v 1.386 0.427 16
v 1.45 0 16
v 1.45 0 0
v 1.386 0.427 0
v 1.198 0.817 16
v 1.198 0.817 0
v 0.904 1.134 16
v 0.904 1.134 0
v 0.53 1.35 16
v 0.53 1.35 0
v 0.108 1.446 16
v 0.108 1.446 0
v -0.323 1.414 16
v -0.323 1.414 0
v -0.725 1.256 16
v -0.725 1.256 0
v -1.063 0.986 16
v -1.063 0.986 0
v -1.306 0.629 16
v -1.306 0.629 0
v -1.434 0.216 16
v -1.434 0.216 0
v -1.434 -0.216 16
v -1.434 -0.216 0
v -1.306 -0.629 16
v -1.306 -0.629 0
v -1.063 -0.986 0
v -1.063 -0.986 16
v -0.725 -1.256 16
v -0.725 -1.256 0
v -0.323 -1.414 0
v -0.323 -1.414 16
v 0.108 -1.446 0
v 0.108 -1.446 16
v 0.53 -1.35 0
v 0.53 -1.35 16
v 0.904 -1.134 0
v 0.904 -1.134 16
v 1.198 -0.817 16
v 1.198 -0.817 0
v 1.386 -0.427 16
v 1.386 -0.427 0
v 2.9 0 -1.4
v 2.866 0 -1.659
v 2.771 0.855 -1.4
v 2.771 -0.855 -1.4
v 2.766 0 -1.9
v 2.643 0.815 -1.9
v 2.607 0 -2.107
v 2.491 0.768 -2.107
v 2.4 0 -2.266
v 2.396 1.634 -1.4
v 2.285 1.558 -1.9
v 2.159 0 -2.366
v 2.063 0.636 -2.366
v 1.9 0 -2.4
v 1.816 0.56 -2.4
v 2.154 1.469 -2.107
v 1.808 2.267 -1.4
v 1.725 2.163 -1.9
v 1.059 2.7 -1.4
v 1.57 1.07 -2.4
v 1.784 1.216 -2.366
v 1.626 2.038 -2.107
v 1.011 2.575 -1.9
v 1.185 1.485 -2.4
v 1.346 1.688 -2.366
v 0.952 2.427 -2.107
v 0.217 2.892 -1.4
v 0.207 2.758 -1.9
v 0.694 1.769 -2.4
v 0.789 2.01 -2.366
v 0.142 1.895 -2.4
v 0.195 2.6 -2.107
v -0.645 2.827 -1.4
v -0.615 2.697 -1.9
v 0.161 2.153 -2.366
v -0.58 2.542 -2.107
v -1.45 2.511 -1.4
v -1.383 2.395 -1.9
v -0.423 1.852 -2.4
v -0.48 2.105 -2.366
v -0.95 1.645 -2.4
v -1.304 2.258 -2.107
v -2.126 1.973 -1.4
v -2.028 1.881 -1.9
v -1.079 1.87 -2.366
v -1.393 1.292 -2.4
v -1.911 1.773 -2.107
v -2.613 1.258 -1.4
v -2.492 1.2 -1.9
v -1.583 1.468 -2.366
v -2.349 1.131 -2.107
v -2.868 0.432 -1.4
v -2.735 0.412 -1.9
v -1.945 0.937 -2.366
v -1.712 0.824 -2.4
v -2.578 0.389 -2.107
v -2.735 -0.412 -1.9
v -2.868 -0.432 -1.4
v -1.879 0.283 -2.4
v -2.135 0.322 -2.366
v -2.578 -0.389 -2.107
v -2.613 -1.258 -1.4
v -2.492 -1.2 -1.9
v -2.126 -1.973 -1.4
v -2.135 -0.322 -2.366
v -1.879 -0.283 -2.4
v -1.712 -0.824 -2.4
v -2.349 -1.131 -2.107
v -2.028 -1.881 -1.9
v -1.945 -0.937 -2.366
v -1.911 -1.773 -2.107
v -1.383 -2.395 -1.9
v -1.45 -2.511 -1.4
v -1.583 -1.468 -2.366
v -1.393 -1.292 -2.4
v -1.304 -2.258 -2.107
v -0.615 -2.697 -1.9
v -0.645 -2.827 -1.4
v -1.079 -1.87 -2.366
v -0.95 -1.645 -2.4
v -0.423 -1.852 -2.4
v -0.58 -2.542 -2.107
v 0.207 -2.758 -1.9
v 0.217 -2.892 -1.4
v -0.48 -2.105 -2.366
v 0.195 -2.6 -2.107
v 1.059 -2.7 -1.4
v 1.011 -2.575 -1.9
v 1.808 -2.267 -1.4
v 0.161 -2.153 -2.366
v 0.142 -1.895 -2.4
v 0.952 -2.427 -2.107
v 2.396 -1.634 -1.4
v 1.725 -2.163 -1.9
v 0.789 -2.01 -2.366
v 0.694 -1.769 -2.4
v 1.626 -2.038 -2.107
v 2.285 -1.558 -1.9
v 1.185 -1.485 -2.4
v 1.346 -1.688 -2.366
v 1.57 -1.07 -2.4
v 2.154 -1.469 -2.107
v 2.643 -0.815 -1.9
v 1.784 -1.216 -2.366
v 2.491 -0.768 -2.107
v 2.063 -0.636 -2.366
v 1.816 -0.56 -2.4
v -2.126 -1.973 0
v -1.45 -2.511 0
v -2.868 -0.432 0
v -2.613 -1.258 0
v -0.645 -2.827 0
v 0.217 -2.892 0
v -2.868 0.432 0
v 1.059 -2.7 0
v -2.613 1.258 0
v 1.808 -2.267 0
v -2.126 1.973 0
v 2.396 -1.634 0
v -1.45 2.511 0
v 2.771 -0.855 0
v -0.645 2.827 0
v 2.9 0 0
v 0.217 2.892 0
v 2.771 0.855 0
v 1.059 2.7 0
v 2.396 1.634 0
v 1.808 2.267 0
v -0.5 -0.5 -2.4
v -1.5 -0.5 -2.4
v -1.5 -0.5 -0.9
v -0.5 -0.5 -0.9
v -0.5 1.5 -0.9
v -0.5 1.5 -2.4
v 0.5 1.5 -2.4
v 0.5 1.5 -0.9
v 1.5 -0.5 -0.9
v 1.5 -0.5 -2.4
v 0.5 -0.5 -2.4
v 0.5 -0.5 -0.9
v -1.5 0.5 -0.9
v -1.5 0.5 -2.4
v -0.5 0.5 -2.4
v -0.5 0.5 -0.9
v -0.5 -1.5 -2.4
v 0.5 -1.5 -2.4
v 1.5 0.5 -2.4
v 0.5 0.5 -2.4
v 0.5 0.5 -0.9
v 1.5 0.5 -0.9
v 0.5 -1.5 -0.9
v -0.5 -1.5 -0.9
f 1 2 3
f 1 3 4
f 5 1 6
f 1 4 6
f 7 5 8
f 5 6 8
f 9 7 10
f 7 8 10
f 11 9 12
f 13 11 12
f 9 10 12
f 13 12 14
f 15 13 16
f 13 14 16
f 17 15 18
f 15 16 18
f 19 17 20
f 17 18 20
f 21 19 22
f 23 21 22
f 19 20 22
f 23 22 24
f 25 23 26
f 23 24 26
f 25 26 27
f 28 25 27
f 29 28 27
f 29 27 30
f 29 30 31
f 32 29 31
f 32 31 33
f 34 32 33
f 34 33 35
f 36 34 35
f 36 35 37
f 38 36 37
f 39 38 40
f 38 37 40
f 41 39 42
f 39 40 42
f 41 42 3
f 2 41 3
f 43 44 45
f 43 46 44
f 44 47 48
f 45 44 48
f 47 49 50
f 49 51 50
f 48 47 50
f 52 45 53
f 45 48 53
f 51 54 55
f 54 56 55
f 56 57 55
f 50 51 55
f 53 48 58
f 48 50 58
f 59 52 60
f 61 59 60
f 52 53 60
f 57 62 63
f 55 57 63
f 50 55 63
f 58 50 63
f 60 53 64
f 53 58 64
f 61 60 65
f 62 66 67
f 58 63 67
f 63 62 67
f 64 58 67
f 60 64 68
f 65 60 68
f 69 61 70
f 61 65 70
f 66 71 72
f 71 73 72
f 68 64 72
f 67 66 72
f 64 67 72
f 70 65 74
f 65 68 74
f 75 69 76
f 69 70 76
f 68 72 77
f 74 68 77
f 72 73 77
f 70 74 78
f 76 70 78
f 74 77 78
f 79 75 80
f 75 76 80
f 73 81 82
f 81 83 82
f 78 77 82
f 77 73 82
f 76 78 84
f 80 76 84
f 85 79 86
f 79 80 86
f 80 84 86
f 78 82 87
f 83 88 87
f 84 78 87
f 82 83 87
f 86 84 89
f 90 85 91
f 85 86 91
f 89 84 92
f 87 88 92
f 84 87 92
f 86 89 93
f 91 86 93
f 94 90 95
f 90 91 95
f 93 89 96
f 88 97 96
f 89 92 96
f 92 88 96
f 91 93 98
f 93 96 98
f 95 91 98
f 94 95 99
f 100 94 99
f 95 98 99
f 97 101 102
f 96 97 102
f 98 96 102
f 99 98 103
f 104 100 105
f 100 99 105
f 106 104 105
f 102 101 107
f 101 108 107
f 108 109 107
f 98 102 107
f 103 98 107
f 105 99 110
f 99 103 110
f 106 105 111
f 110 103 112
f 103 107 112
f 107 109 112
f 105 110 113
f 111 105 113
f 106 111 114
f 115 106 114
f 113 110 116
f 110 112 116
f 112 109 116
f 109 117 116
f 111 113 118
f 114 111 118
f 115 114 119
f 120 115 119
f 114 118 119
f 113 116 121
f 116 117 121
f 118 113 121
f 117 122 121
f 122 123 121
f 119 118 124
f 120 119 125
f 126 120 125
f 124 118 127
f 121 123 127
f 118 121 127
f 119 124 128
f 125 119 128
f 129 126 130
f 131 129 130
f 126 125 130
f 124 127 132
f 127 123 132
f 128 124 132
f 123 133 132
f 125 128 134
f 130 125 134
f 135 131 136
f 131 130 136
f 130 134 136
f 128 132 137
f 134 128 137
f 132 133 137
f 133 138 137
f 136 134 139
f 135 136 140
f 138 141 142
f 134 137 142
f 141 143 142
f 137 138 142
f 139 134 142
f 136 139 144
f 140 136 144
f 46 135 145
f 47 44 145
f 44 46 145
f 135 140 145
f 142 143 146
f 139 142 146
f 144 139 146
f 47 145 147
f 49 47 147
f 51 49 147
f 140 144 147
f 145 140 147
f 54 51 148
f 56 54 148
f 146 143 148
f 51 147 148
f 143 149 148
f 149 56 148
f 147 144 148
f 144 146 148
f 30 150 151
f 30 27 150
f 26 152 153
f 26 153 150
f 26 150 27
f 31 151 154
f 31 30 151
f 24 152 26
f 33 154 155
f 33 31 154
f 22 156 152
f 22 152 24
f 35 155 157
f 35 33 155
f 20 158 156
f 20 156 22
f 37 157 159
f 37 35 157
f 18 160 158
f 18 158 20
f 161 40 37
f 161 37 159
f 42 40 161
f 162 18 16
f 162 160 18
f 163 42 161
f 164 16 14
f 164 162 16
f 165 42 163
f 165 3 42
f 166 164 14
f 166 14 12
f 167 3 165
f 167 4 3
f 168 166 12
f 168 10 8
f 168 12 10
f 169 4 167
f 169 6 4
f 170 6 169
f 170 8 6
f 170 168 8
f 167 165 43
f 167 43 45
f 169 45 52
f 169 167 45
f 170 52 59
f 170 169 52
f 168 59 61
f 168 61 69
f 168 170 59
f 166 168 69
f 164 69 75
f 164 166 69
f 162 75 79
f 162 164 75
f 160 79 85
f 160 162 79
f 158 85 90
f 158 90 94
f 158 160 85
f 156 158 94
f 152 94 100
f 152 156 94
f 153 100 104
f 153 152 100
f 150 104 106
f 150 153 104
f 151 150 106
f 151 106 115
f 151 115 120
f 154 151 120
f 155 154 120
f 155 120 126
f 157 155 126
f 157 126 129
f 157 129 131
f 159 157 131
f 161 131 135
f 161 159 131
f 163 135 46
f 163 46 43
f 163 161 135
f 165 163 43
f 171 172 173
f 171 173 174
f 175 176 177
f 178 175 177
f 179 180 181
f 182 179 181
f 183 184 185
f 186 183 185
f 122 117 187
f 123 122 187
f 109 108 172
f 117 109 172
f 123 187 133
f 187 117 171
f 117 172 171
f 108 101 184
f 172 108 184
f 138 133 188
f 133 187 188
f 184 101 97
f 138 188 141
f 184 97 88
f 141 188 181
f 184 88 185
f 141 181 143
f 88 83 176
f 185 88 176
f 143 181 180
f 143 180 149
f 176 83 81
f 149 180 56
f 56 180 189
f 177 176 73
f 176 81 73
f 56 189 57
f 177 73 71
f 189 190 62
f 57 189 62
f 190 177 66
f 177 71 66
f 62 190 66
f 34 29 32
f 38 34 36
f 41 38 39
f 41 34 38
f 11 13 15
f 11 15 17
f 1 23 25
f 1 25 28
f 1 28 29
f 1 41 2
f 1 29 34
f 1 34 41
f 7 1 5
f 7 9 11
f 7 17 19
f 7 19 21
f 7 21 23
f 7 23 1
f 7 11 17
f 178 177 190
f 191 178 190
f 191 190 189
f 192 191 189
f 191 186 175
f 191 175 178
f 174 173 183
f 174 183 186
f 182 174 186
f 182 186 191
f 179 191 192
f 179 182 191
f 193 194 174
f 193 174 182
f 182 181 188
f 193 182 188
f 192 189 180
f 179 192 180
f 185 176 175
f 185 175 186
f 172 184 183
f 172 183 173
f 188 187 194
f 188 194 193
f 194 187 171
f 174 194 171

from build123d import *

# Parameters (mm, degrees)
F0_R     = 1.45
F1_DEPTH = 16
F2_R     = 2.9
F3_DEPTH = 2.4
F4_R     = 1
F5_W     = 1
F5_H     = 1
F6_DEPTH = 1.5


with BuildPart() as f1:
    # F0 (on Top) → F1 (new body)
    with BuildSketch(Plane.XY):
        Circle(F0_R)
    extrude(amount=F1_DEPTH)

    # F2 (on Top) → F3 (join)
    with BuildSketch(Plane.XY):
        Circle(F2_R)
    extrude(amount=-F3_DEPTH)

    # F4
    f4_edges = [f1.edges().sort_by_distance(p)[0] for p in [
        (-2.9, 0, -2.4),
    ]]
    fillet(f4_edges, radius=F4_R)

    # F5 (on face) → F6 (cut)
    with BuildSketch(Plane(origin=(0, 0, -2.4), x_dir=(1, 0, 0), z_dir=(0, 0, -1))):
        with Locations((1, 0)):
            Rectangle(F5_W, F5_H)
        Rectangle(F5_W, F5_H)
        with Locations((0, 1)):
            Rectangle(F5_W, F5_H)
        with Locations((-1, 0)):
            Rectangle(F5_W, F5_H)
        with Locations((0, -1)):
            Rectangle(F5_W, F5_H)
    extrude(amount=-F6_DEPTH, mode=Mode.SUBTRACT)


solid = f1.part
